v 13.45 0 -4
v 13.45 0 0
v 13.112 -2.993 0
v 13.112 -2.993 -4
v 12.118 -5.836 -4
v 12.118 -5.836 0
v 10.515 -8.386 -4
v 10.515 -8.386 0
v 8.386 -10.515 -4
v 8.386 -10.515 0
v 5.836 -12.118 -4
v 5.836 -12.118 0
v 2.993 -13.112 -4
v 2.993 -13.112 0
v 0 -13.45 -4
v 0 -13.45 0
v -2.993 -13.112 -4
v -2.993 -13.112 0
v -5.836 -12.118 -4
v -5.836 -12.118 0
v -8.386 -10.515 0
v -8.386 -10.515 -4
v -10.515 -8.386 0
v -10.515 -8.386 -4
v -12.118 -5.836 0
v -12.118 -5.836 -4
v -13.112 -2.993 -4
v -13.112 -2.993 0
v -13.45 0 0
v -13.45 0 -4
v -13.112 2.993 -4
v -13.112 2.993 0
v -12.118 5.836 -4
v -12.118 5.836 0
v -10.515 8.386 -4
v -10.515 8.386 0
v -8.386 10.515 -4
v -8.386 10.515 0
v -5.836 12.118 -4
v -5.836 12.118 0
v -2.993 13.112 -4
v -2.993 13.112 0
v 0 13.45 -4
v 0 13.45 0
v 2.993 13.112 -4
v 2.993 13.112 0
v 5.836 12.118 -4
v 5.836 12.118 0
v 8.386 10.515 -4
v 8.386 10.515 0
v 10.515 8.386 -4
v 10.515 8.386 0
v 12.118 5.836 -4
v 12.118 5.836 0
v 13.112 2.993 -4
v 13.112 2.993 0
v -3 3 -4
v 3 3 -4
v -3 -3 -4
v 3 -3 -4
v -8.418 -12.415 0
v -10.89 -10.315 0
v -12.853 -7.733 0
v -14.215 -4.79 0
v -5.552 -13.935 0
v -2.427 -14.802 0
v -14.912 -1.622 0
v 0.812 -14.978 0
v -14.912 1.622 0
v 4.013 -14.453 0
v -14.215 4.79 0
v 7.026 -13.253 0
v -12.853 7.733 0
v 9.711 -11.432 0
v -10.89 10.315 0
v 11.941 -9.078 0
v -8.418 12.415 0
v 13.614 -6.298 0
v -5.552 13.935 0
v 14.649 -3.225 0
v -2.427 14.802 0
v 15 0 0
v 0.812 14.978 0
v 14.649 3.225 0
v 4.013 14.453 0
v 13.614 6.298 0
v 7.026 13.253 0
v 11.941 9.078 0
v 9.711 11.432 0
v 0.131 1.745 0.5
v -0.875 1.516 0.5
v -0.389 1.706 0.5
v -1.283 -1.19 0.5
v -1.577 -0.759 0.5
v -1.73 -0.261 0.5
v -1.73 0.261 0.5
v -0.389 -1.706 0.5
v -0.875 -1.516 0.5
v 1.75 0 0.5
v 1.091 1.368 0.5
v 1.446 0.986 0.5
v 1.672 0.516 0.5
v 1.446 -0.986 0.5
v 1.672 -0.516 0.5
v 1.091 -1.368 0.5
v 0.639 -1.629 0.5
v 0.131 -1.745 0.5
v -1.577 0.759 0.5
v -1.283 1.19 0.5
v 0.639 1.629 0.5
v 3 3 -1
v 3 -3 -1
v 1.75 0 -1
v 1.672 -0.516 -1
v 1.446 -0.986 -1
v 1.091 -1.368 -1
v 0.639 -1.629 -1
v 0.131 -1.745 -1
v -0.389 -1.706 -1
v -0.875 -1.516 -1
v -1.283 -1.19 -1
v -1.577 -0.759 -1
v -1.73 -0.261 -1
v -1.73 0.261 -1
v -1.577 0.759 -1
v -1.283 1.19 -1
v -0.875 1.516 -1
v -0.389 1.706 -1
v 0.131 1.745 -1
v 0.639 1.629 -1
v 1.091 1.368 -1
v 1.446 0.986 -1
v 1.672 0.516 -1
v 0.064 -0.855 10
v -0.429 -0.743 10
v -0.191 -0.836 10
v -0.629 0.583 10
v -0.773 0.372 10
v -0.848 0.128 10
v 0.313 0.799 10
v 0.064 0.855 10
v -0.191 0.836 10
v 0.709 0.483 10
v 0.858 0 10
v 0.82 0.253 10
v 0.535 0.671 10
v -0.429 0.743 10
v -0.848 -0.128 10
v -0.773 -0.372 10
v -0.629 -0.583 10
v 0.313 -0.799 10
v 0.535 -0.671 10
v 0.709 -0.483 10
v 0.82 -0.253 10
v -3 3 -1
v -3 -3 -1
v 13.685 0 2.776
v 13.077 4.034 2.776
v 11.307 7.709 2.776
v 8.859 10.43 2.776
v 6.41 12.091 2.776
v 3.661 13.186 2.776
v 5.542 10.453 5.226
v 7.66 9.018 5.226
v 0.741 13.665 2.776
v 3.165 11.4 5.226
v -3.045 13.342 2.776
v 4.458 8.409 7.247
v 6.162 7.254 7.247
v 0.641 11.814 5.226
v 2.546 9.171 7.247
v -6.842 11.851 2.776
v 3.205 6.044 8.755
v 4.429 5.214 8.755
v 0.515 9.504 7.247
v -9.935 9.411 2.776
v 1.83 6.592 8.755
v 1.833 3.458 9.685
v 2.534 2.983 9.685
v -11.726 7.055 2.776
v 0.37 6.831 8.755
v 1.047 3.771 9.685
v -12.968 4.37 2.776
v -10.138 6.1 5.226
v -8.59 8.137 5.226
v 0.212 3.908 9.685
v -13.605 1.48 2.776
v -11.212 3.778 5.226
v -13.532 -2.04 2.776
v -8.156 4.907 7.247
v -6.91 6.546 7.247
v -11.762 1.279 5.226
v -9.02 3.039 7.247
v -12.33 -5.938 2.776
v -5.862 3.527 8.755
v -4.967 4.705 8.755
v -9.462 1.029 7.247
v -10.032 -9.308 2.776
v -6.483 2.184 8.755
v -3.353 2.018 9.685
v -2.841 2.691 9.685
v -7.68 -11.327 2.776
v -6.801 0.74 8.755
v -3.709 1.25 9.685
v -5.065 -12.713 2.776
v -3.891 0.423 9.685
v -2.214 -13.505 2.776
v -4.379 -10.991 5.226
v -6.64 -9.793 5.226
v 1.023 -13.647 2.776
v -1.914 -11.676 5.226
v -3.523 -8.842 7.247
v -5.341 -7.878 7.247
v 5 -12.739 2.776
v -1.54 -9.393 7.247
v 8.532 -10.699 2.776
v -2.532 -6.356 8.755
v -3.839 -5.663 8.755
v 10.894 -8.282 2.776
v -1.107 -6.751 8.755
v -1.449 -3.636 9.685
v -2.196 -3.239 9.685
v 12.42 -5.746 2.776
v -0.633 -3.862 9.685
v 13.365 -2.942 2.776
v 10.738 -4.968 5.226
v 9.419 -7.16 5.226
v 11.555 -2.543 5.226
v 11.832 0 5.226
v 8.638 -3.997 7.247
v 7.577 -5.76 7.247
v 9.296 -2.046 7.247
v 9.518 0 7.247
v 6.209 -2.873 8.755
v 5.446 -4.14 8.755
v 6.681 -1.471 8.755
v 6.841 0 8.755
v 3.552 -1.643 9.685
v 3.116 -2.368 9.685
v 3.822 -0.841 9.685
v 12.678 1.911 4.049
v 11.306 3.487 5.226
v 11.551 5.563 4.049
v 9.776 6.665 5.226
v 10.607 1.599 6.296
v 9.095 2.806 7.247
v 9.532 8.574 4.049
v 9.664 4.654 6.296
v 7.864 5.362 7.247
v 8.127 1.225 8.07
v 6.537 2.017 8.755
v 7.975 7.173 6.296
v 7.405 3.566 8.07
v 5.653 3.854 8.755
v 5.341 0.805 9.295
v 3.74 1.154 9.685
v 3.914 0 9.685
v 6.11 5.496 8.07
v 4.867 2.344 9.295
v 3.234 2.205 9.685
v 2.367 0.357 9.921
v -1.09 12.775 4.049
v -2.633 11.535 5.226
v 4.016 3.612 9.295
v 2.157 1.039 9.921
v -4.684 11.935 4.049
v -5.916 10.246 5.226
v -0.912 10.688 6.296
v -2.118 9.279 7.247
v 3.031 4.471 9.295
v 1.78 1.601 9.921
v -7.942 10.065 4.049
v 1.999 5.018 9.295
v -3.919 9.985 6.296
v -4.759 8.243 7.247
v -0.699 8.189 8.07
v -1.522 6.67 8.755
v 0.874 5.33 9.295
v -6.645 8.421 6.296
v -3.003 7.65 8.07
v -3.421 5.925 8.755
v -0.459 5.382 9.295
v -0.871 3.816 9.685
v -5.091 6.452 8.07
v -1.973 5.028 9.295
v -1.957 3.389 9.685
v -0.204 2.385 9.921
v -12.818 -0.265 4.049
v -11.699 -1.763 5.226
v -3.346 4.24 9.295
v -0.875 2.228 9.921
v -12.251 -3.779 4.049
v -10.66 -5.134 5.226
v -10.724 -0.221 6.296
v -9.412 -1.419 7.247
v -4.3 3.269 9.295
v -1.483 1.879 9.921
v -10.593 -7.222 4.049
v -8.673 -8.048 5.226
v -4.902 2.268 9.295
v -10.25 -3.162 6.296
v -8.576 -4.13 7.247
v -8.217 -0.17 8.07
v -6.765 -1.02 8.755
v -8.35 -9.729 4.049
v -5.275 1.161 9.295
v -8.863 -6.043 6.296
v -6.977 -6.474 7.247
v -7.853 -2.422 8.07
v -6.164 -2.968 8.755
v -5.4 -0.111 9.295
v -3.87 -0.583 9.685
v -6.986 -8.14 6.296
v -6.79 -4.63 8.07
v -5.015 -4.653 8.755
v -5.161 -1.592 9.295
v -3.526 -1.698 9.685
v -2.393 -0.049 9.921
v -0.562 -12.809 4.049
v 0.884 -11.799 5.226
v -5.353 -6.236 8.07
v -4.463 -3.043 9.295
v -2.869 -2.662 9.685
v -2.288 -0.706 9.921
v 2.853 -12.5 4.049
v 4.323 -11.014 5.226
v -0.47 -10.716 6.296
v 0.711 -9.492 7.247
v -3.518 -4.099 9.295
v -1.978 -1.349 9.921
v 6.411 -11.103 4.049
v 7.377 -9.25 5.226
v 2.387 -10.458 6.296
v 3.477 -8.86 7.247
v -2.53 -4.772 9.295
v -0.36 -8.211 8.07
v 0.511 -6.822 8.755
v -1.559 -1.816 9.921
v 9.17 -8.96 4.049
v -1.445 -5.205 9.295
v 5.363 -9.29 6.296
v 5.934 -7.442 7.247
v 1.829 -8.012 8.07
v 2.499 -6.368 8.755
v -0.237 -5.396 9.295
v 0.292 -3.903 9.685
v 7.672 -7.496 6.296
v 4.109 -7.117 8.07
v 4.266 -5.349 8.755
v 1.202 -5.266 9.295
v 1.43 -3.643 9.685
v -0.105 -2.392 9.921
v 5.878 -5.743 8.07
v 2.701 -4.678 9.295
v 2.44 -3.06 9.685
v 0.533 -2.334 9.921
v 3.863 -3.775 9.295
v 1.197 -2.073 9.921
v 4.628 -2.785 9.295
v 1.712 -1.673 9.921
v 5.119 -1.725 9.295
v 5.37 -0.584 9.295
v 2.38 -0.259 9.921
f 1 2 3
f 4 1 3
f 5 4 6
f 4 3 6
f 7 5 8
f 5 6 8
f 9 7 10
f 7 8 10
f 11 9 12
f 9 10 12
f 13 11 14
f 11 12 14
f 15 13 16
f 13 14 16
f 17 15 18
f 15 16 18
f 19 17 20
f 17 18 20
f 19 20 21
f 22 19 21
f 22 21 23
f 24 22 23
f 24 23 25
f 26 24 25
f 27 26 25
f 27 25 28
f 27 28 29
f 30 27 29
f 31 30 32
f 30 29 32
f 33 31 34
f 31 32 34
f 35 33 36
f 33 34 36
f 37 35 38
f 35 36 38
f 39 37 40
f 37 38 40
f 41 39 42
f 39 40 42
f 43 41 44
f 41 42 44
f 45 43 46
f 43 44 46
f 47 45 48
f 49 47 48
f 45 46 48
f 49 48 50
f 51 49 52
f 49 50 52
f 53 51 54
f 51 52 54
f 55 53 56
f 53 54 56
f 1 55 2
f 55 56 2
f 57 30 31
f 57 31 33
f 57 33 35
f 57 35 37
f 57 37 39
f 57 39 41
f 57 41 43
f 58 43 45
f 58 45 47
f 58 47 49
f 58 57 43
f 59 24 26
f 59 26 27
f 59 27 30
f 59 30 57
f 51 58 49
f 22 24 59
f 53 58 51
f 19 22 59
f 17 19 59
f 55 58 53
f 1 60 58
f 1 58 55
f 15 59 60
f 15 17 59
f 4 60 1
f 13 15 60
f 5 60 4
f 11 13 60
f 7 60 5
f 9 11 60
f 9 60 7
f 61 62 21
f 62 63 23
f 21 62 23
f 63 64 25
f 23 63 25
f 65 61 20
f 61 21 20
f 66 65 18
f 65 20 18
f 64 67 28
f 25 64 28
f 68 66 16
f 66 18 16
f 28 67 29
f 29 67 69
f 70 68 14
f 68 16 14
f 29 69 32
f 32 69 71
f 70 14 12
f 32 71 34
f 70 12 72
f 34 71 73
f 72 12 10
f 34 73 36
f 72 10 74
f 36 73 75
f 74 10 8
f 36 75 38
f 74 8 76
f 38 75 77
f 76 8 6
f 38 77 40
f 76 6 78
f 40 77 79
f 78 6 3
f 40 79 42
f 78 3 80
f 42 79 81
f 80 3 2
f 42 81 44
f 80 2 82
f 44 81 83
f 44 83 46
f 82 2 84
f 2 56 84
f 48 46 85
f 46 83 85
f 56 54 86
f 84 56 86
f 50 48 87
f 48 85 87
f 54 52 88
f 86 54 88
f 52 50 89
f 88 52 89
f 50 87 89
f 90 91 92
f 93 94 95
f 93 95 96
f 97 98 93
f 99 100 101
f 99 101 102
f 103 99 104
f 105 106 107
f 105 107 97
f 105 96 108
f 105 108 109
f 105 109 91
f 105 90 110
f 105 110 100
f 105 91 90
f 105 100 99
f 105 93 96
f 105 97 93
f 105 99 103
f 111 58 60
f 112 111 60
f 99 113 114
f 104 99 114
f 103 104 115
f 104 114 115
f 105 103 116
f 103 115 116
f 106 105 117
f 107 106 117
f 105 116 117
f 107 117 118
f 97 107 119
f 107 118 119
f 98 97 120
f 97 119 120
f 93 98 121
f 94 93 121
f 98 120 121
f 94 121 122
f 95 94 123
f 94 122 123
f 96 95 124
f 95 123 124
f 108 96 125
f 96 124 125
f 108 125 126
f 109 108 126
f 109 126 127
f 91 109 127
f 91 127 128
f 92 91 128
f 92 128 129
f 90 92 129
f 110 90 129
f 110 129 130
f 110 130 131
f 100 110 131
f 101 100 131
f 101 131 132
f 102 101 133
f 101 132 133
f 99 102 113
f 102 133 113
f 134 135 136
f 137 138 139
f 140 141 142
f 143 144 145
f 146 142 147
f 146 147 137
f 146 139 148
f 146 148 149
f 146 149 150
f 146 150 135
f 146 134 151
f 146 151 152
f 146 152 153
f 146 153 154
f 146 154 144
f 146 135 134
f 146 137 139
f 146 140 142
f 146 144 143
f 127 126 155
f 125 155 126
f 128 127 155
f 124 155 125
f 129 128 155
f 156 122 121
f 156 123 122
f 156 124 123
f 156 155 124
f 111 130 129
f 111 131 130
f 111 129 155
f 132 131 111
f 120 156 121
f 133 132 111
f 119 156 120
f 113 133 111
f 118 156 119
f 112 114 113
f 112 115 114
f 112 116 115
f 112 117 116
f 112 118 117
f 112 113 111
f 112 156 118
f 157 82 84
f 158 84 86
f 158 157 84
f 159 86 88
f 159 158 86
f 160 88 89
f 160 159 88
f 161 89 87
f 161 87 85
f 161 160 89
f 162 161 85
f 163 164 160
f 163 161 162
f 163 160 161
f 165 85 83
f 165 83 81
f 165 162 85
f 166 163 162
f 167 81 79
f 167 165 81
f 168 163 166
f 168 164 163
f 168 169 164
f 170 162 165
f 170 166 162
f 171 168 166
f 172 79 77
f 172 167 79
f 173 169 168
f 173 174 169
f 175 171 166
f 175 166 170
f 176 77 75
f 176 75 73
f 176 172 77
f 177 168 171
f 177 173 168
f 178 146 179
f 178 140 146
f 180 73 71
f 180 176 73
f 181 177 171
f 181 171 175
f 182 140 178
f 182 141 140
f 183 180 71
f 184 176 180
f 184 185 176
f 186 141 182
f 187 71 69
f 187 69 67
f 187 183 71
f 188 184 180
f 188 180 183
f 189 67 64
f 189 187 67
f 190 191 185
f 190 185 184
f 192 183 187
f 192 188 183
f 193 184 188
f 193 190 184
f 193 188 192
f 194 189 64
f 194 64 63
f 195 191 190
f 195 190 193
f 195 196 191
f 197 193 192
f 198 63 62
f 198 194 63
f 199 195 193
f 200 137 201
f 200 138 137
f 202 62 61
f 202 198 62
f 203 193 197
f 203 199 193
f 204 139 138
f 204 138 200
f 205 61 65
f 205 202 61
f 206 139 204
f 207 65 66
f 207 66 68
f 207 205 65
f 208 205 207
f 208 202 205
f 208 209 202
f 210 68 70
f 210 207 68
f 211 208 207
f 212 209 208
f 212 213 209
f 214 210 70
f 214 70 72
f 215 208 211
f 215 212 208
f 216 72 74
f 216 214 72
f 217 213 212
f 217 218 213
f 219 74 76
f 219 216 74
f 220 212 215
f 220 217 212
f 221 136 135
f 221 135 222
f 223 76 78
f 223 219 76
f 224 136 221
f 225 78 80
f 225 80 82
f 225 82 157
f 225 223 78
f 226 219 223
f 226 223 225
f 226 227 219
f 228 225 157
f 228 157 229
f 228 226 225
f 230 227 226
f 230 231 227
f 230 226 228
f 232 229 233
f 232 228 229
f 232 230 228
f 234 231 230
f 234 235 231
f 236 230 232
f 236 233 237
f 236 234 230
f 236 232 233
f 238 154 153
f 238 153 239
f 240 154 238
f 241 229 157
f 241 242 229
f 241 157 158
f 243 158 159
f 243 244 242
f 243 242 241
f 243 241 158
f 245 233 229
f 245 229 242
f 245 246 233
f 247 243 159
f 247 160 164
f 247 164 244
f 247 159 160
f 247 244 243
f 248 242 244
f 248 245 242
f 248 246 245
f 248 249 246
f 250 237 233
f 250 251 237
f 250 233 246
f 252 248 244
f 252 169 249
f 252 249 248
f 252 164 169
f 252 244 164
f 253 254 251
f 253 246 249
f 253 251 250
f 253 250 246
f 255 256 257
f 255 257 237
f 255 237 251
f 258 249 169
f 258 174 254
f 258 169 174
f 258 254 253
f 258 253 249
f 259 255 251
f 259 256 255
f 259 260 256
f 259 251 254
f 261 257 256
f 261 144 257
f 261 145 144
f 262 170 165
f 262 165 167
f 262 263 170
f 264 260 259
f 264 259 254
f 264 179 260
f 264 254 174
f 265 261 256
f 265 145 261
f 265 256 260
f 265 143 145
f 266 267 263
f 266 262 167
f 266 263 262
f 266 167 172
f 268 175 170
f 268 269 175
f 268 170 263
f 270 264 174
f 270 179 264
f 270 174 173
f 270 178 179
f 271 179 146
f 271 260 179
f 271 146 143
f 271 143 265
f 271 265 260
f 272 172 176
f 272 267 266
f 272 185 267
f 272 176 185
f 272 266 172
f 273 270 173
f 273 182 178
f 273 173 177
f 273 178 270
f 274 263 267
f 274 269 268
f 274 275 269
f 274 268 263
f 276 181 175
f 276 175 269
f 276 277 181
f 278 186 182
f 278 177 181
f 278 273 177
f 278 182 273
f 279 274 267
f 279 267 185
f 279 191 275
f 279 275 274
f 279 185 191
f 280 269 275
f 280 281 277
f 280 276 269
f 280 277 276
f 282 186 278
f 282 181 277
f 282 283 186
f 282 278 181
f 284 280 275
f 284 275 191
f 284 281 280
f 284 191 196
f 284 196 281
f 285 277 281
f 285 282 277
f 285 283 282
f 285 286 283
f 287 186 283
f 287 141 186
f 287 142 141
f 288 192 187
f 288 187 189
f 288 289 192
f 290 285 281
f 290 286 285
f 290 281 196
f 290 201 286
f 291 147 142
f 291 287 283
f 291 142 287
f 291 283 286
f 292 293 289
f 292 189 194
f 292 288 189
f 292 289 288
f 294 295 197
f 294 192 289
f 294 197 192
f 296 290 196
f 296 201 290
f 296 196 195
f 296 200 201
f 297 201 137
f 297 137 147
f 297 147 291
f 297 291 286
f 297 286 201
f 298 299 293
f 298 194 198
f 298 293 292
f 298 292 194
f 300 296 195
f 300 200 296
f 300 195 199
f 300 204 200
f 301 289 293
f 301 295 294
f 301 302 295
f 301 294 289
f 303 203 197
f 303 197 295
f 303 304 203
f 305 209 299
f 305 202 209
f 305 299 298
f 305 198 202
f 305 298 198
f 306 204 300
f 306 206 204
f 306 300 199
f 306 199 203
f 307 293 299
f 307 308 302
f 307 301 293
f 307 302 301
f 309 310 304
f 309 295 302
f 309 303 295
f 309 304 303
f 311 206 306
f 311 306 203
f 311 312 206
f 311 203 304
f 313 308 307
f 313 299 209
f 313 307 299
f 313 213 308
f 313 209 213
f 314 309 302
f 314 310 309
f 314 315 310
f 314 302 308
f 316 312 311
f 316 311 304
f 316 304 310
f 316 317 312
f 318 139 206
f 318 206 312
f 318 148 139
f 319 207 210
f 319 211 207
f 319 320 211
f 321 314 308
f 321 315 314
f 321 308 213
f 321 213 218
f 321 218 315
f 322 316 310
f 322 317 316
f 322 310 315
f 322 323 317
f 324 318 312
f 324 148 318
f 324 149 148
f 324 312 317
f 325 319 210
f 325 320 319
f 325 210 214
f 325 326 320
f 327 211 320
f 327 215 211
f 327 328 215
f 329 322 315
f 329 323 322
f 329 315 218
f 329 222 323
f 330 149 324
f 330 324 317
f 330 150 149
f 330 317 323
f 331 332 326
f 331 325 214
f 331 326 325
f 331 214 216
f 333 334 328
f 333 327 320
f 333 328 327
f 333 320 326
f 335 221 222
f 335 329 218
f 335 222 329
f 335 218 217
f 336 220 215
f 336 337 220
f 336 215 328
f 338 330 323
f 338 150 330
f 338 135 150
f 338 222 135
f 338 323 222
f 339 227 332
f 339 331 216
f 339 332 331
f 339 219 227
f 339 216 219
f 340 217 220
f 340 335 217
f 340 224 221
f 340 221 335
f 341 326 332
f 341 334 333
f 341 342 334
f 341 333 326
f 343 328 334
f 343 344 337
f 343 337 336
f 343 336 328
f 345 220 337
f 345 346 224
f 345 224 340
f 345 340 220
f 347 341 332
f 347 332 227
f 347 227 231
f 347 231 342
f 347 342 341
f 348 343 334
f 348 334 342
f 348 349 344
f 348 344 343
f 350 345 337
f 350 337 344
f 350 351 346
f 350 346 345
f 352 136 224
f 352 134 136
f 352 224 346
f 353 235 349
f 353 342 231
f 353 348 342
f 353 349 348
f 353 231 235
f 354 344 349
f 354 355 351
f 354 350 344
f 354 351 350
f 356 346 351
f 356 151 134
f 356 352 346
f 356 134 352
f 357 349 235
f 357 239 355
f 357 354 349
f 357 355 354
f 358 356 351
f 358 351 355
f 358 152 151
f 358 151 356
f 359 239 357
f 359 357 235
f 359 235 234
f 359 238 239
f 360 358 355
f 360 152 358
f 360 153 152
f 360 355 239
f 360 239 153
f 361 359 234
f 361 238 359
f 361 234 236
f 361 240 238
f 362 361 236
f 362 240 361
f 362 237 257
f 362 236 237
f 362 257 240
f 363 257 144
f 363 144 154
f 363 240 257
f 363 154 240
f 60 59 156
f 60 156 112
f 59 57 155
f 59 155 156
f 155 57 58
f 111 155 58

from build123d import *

# Parameters (mm, degrees)
F0_R     = 15
F1_DEPTH = 10
F3_R     = 13.4495
F4_DEPTH = 4
F5_W     = 6
F5_H     = 6
F6_DEPTH = 3
F7_R     = 1.75
F8_DEPTH = 1.5


# Not quite as in the source:
# - a fillet or chamfer that OpenCascade refuses, or shapes differently, is made with other operations: its cross-section is extruded or revolved along the edge and cut away or added


with BuildPart() as f1:
    # F0 (on Top) → F1 (new body)
    with BuildSketch(Plane.XY):
        Circle(F0_R)
    extrude(amount=F1_DEPTH)

    # F2: fillet of radius 15 on 1 edges, made by hand

    # F2_s1 → F2_t2 (revolve, cut)
    with BuildSketch(Plane.XZ):
        with BuildLine():
            ThreePointArc((15, 0), (9.5181184141, 7.2474487139), (0.8578643763, 10))
            Line((0.8578643763, 10), (15, 10))
            Line((15, 10), (15, 0))
        make_face()
    revolve(axis=Axis((0, 0, 10), (0, 0, 1)), mode=Mode.SUBTRACT)

    # F3 (on face) → F4 (join)
    with BuildSketch(Plane(origin=(0, 0, 0), x_dir=(1, 0, 0), z_dir=(0, 0, -1))):
        Circle(F3_R)
    extrude(amount=F4_DEPTH)

    # F5 (on face) → F6 (cut)
    with BuildSketch(Plane(origin=(0, 0, -4), x_dir=(1, 0, 0), z_dir=(0, 0, -1))):
        Rectangle(F5_W, F5_H)
    extrude(amount=-F6_DEPTH, mode=Mode.SUBTRACT)

    # F7 (on face) → F8 (cut)
    with BuildSketch(Plane(origin=(0, 0, -1), x_dir=(1, 0, 0), z_dir=(0, 0, -1))):
        Circle(F7_R)
    extrude(amount=-F8_DEPTH, mode=Mode.SUBTRACT)


solid = f1.part
